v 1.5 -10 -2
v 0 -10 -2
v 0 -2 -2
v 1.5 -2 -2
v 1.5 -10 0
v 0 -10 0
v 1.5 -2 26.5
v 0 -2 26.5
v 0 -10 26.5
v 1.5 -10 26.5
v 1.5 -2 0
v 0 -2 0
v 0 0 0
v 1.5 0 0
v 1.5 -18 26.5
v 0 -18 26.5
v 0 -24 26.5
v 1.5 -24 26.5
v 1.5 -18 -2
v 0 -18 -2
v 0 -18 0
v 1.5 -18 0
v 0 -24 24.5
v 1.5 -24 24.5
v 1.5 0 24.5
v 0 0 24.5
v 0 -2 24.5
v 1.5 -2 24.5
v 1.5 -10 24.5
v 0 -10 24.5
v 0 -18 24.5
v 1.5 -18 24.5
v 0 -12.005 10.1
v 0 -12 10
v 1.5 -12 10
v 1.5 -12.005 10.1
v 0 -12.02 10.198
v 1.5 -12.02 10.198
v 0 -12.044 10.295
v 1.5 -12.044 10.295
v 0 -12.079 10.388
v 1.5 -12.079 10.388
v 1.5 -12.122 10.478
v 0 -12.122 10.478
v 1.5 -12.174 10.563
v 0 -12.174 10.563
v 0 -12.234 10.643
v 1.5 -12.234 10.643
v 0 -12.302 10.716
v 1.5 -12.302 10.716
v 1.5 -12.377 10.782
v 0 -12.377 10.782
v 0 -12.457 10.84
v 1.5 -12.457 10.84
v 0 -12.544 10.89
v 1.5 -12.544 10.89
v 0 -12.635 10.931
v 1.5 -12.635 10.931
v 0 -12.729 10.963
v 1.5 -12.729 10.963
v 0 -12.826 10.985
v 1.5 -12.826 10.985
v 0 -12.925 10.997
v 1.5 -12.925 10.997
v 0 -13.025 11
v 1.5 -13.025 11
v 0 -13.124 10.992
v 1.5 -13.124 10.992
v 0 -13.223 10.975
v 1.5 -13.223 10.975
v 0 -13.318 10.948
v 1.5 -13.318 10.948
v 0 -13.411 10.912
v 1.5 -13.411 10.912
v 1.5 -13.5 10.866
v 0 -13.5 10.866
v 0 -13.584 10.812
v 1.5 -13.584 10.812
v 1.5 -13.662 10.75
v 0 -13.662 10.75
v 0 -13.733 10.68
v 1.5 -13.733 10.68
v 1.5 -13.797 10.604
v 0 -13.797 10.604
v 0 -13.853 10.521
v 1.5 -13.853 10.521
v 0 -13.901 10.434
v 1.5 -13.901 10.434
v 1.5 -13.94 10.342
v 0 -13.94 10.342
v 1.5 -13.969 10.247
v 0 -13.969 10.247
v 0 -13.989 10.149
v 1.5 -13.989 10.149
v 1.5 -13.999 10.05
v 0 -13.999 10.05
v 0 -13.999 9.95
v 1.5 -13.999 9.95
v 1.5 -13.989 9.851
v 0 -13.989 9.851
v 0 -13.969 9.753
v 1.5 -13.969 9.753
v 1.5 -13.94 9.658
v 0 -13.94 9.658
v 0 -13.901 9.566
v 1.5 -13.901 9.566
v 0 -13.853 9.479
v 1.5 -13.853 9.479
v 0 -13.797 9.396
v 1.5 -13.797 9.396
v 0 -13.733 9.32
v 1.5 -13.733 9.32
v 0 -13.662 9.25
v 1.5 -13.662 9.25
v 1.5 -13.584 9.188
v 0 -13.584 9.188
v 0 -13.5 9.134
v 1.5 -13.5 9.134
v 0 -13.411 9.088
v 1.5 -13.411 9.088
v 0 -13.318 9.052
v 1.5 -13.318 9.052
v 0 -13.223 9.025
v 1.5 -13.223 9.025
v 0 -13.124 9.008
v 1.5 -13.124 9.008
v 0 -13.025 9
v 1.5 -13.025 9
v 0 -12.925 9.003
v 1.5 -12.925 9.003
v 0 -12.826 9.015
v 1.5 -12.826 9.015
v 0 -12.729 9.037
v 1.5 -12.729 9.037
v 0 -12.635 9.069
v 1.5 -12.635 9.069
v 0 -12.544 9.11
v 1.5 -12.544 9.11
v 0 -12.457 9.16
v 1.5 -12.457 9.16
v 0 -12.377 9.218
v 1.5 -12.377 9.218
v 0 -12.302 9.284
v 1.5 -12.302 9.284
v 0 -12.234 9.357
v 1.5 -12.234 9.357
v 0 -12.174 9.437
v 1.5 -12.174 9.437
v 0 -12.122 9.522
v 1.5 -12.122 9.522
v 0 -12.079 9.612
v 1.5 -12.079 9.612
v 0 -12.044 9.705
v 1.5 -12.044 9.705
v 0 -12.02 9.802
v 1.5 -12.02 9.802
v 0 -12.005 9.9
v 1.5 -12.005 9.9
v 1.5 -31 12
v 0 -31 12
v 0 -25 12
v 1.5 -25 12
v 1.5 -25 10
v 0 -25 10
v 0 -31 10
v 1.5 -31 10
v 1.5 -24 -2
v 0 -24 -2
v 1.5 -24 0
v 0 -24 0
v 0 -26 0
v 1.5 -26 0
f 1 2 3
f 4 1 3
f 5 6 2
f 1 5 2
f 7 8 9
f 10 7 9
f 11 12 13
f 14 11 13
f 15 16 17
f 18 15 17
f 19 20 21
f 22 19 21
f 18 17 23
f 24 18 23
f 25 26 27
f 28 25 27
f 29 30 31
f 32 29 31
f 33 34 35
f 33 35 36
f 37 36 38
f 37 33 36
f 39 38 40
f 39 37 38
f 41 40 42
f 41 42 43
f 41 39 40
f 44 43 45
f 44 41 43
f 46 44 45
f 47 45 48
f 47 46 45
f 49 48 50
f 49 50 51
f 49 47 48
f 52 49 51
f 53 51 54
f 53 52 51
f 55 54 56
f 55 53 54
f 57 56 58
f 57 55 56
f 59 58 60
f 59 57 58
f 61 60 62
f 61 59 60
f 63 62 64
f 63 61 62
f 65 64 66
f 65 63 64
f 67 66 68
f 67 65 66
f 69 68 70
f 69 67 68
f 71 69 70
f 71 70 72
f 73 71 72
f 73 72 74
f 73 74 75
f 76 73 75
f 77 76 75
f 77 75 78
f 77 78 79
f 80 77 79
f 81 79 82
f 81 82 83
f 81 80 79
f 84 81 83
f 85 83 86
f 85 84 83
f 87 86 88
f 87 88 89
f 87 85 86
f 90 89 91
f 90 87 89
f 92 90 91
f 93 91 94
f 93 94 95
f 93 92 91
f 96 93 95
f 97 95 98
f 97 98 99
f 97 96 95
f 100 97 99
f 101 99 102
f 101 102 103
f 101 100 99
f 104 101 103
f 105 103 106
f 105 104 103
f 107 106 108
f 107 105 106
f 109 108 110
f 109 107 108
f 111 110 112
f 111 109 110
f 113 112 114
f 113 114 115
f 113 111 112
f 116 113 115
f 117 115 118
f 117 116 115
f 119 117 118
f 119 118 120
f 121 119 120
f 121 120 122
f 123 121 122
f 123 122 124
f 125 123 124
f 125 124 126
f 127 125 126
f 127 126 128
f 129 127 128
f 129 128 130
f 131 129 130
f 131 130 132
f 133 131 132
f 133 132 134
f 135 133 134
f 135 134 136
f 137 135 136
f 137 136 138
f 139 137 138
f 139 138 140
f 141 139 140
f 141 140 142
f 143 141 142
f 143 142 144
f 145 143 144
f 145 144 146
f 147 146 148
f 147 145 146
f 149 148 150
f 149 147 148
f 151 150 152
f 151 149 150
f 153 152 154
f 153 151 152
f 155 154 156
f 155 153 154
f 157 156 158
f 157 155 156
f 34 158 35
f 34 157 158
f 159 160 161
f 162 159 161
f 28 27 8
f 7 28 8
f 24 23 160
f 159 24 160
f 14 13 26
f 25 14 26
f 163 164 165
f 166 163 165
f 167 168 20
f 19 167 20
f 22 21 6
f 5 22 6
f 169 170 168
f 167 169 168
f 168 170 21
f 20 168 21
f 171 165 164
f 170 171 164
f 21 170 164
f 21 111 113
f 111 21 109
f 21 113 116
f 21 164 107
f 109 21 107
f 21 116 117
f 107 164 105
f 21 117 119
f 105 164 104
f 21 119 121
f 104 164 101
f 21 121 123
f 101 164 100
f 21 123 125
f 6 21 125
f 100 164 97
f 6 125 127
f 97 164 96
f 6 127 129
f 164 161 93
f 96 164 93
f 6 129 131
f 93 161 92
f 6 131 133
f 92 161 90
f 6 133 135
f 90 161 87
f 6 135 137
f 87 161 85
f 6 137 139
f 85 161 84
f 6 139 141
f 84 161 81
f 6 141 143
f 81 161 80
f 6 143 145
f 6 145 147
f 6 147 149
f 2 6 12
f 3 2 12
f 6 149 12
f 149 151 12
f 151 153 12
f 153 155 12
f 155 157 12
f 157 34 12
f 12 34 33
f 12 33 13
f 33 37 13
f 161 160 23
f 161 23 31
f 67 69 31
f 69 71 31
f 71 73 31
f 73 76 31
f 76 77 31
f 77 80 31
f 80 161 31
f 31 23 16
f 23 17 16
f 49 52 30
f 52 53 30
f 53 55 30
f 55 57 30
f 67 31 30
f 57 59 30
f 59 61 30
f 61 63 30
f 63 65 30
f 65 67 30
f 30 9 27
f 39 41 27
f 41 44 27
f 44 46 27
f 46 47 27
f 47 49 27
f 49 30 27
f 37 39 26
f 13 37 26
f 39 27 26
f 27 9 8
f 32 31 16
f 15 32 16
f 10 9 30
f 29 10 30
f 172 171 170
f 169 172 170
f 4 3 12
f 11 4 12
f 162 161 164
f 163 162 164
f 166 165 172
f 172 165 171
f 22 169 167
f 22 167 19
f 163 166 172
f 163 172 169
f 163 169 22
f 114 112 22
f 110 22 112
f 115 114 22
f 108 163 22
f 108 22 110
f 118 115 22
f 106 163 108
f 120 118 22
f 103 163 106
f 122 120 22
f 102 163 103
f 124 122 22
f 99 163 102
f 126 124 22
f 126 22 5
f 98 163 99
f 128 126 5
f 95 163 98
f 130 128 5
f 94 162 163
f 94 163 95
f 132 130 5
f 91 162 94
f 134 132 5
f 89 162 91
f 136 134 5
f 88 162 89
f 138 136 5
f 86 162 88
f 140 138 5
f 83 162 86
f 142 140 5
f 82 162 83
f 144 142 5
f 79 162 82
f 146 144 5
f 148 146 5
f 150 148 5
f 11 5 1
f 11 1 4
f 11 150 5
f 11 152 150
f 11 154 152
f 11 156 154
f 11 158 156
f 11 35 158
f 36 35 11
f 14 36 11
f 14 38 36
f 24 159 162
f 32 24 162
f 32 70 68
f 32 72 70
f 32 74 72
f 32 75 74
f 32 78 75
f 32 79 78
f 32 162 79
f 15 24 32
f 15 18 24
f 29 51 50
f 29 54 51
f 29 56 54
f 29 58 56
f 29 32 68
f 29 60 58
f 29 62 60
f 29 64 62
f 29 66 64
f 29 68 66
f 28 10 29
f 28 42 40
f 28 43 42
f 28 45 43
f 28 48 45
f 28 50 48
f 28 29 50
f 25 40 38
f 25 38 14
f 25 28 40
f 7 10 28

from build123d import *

# Parameters (mm, degrees)
F0_R     = 1
F1_DEPTH = 1.5


with BuildPart() as f1:
    # F0 (on Right) → F1 (new body)
    with BuildSketch(Plane.YZ):
        Polygon((-2, 0), (0, 0), (0, 24.5), (-2, 24.5), (-2, 26.5), (-10, 26.5), (-10, 24.5), (-18, 24.5), (-18, 26.5), (-24, 26.5), (-24, 24.5), (-31, 12), (-25, 12), (-25, 10), (-31, 10), (-26, 0), (-24, 0), (-24, -2), (-18, -2), (-18, 0), (-10, 0), (-10, -2), (-2, -2), align=None)
        with Locations((-13, 10)):
            Circle(F0_R, mode=Mode.SUBTRACT)
    extrude(amount=F1_DEPTH)


solid = f1.part
